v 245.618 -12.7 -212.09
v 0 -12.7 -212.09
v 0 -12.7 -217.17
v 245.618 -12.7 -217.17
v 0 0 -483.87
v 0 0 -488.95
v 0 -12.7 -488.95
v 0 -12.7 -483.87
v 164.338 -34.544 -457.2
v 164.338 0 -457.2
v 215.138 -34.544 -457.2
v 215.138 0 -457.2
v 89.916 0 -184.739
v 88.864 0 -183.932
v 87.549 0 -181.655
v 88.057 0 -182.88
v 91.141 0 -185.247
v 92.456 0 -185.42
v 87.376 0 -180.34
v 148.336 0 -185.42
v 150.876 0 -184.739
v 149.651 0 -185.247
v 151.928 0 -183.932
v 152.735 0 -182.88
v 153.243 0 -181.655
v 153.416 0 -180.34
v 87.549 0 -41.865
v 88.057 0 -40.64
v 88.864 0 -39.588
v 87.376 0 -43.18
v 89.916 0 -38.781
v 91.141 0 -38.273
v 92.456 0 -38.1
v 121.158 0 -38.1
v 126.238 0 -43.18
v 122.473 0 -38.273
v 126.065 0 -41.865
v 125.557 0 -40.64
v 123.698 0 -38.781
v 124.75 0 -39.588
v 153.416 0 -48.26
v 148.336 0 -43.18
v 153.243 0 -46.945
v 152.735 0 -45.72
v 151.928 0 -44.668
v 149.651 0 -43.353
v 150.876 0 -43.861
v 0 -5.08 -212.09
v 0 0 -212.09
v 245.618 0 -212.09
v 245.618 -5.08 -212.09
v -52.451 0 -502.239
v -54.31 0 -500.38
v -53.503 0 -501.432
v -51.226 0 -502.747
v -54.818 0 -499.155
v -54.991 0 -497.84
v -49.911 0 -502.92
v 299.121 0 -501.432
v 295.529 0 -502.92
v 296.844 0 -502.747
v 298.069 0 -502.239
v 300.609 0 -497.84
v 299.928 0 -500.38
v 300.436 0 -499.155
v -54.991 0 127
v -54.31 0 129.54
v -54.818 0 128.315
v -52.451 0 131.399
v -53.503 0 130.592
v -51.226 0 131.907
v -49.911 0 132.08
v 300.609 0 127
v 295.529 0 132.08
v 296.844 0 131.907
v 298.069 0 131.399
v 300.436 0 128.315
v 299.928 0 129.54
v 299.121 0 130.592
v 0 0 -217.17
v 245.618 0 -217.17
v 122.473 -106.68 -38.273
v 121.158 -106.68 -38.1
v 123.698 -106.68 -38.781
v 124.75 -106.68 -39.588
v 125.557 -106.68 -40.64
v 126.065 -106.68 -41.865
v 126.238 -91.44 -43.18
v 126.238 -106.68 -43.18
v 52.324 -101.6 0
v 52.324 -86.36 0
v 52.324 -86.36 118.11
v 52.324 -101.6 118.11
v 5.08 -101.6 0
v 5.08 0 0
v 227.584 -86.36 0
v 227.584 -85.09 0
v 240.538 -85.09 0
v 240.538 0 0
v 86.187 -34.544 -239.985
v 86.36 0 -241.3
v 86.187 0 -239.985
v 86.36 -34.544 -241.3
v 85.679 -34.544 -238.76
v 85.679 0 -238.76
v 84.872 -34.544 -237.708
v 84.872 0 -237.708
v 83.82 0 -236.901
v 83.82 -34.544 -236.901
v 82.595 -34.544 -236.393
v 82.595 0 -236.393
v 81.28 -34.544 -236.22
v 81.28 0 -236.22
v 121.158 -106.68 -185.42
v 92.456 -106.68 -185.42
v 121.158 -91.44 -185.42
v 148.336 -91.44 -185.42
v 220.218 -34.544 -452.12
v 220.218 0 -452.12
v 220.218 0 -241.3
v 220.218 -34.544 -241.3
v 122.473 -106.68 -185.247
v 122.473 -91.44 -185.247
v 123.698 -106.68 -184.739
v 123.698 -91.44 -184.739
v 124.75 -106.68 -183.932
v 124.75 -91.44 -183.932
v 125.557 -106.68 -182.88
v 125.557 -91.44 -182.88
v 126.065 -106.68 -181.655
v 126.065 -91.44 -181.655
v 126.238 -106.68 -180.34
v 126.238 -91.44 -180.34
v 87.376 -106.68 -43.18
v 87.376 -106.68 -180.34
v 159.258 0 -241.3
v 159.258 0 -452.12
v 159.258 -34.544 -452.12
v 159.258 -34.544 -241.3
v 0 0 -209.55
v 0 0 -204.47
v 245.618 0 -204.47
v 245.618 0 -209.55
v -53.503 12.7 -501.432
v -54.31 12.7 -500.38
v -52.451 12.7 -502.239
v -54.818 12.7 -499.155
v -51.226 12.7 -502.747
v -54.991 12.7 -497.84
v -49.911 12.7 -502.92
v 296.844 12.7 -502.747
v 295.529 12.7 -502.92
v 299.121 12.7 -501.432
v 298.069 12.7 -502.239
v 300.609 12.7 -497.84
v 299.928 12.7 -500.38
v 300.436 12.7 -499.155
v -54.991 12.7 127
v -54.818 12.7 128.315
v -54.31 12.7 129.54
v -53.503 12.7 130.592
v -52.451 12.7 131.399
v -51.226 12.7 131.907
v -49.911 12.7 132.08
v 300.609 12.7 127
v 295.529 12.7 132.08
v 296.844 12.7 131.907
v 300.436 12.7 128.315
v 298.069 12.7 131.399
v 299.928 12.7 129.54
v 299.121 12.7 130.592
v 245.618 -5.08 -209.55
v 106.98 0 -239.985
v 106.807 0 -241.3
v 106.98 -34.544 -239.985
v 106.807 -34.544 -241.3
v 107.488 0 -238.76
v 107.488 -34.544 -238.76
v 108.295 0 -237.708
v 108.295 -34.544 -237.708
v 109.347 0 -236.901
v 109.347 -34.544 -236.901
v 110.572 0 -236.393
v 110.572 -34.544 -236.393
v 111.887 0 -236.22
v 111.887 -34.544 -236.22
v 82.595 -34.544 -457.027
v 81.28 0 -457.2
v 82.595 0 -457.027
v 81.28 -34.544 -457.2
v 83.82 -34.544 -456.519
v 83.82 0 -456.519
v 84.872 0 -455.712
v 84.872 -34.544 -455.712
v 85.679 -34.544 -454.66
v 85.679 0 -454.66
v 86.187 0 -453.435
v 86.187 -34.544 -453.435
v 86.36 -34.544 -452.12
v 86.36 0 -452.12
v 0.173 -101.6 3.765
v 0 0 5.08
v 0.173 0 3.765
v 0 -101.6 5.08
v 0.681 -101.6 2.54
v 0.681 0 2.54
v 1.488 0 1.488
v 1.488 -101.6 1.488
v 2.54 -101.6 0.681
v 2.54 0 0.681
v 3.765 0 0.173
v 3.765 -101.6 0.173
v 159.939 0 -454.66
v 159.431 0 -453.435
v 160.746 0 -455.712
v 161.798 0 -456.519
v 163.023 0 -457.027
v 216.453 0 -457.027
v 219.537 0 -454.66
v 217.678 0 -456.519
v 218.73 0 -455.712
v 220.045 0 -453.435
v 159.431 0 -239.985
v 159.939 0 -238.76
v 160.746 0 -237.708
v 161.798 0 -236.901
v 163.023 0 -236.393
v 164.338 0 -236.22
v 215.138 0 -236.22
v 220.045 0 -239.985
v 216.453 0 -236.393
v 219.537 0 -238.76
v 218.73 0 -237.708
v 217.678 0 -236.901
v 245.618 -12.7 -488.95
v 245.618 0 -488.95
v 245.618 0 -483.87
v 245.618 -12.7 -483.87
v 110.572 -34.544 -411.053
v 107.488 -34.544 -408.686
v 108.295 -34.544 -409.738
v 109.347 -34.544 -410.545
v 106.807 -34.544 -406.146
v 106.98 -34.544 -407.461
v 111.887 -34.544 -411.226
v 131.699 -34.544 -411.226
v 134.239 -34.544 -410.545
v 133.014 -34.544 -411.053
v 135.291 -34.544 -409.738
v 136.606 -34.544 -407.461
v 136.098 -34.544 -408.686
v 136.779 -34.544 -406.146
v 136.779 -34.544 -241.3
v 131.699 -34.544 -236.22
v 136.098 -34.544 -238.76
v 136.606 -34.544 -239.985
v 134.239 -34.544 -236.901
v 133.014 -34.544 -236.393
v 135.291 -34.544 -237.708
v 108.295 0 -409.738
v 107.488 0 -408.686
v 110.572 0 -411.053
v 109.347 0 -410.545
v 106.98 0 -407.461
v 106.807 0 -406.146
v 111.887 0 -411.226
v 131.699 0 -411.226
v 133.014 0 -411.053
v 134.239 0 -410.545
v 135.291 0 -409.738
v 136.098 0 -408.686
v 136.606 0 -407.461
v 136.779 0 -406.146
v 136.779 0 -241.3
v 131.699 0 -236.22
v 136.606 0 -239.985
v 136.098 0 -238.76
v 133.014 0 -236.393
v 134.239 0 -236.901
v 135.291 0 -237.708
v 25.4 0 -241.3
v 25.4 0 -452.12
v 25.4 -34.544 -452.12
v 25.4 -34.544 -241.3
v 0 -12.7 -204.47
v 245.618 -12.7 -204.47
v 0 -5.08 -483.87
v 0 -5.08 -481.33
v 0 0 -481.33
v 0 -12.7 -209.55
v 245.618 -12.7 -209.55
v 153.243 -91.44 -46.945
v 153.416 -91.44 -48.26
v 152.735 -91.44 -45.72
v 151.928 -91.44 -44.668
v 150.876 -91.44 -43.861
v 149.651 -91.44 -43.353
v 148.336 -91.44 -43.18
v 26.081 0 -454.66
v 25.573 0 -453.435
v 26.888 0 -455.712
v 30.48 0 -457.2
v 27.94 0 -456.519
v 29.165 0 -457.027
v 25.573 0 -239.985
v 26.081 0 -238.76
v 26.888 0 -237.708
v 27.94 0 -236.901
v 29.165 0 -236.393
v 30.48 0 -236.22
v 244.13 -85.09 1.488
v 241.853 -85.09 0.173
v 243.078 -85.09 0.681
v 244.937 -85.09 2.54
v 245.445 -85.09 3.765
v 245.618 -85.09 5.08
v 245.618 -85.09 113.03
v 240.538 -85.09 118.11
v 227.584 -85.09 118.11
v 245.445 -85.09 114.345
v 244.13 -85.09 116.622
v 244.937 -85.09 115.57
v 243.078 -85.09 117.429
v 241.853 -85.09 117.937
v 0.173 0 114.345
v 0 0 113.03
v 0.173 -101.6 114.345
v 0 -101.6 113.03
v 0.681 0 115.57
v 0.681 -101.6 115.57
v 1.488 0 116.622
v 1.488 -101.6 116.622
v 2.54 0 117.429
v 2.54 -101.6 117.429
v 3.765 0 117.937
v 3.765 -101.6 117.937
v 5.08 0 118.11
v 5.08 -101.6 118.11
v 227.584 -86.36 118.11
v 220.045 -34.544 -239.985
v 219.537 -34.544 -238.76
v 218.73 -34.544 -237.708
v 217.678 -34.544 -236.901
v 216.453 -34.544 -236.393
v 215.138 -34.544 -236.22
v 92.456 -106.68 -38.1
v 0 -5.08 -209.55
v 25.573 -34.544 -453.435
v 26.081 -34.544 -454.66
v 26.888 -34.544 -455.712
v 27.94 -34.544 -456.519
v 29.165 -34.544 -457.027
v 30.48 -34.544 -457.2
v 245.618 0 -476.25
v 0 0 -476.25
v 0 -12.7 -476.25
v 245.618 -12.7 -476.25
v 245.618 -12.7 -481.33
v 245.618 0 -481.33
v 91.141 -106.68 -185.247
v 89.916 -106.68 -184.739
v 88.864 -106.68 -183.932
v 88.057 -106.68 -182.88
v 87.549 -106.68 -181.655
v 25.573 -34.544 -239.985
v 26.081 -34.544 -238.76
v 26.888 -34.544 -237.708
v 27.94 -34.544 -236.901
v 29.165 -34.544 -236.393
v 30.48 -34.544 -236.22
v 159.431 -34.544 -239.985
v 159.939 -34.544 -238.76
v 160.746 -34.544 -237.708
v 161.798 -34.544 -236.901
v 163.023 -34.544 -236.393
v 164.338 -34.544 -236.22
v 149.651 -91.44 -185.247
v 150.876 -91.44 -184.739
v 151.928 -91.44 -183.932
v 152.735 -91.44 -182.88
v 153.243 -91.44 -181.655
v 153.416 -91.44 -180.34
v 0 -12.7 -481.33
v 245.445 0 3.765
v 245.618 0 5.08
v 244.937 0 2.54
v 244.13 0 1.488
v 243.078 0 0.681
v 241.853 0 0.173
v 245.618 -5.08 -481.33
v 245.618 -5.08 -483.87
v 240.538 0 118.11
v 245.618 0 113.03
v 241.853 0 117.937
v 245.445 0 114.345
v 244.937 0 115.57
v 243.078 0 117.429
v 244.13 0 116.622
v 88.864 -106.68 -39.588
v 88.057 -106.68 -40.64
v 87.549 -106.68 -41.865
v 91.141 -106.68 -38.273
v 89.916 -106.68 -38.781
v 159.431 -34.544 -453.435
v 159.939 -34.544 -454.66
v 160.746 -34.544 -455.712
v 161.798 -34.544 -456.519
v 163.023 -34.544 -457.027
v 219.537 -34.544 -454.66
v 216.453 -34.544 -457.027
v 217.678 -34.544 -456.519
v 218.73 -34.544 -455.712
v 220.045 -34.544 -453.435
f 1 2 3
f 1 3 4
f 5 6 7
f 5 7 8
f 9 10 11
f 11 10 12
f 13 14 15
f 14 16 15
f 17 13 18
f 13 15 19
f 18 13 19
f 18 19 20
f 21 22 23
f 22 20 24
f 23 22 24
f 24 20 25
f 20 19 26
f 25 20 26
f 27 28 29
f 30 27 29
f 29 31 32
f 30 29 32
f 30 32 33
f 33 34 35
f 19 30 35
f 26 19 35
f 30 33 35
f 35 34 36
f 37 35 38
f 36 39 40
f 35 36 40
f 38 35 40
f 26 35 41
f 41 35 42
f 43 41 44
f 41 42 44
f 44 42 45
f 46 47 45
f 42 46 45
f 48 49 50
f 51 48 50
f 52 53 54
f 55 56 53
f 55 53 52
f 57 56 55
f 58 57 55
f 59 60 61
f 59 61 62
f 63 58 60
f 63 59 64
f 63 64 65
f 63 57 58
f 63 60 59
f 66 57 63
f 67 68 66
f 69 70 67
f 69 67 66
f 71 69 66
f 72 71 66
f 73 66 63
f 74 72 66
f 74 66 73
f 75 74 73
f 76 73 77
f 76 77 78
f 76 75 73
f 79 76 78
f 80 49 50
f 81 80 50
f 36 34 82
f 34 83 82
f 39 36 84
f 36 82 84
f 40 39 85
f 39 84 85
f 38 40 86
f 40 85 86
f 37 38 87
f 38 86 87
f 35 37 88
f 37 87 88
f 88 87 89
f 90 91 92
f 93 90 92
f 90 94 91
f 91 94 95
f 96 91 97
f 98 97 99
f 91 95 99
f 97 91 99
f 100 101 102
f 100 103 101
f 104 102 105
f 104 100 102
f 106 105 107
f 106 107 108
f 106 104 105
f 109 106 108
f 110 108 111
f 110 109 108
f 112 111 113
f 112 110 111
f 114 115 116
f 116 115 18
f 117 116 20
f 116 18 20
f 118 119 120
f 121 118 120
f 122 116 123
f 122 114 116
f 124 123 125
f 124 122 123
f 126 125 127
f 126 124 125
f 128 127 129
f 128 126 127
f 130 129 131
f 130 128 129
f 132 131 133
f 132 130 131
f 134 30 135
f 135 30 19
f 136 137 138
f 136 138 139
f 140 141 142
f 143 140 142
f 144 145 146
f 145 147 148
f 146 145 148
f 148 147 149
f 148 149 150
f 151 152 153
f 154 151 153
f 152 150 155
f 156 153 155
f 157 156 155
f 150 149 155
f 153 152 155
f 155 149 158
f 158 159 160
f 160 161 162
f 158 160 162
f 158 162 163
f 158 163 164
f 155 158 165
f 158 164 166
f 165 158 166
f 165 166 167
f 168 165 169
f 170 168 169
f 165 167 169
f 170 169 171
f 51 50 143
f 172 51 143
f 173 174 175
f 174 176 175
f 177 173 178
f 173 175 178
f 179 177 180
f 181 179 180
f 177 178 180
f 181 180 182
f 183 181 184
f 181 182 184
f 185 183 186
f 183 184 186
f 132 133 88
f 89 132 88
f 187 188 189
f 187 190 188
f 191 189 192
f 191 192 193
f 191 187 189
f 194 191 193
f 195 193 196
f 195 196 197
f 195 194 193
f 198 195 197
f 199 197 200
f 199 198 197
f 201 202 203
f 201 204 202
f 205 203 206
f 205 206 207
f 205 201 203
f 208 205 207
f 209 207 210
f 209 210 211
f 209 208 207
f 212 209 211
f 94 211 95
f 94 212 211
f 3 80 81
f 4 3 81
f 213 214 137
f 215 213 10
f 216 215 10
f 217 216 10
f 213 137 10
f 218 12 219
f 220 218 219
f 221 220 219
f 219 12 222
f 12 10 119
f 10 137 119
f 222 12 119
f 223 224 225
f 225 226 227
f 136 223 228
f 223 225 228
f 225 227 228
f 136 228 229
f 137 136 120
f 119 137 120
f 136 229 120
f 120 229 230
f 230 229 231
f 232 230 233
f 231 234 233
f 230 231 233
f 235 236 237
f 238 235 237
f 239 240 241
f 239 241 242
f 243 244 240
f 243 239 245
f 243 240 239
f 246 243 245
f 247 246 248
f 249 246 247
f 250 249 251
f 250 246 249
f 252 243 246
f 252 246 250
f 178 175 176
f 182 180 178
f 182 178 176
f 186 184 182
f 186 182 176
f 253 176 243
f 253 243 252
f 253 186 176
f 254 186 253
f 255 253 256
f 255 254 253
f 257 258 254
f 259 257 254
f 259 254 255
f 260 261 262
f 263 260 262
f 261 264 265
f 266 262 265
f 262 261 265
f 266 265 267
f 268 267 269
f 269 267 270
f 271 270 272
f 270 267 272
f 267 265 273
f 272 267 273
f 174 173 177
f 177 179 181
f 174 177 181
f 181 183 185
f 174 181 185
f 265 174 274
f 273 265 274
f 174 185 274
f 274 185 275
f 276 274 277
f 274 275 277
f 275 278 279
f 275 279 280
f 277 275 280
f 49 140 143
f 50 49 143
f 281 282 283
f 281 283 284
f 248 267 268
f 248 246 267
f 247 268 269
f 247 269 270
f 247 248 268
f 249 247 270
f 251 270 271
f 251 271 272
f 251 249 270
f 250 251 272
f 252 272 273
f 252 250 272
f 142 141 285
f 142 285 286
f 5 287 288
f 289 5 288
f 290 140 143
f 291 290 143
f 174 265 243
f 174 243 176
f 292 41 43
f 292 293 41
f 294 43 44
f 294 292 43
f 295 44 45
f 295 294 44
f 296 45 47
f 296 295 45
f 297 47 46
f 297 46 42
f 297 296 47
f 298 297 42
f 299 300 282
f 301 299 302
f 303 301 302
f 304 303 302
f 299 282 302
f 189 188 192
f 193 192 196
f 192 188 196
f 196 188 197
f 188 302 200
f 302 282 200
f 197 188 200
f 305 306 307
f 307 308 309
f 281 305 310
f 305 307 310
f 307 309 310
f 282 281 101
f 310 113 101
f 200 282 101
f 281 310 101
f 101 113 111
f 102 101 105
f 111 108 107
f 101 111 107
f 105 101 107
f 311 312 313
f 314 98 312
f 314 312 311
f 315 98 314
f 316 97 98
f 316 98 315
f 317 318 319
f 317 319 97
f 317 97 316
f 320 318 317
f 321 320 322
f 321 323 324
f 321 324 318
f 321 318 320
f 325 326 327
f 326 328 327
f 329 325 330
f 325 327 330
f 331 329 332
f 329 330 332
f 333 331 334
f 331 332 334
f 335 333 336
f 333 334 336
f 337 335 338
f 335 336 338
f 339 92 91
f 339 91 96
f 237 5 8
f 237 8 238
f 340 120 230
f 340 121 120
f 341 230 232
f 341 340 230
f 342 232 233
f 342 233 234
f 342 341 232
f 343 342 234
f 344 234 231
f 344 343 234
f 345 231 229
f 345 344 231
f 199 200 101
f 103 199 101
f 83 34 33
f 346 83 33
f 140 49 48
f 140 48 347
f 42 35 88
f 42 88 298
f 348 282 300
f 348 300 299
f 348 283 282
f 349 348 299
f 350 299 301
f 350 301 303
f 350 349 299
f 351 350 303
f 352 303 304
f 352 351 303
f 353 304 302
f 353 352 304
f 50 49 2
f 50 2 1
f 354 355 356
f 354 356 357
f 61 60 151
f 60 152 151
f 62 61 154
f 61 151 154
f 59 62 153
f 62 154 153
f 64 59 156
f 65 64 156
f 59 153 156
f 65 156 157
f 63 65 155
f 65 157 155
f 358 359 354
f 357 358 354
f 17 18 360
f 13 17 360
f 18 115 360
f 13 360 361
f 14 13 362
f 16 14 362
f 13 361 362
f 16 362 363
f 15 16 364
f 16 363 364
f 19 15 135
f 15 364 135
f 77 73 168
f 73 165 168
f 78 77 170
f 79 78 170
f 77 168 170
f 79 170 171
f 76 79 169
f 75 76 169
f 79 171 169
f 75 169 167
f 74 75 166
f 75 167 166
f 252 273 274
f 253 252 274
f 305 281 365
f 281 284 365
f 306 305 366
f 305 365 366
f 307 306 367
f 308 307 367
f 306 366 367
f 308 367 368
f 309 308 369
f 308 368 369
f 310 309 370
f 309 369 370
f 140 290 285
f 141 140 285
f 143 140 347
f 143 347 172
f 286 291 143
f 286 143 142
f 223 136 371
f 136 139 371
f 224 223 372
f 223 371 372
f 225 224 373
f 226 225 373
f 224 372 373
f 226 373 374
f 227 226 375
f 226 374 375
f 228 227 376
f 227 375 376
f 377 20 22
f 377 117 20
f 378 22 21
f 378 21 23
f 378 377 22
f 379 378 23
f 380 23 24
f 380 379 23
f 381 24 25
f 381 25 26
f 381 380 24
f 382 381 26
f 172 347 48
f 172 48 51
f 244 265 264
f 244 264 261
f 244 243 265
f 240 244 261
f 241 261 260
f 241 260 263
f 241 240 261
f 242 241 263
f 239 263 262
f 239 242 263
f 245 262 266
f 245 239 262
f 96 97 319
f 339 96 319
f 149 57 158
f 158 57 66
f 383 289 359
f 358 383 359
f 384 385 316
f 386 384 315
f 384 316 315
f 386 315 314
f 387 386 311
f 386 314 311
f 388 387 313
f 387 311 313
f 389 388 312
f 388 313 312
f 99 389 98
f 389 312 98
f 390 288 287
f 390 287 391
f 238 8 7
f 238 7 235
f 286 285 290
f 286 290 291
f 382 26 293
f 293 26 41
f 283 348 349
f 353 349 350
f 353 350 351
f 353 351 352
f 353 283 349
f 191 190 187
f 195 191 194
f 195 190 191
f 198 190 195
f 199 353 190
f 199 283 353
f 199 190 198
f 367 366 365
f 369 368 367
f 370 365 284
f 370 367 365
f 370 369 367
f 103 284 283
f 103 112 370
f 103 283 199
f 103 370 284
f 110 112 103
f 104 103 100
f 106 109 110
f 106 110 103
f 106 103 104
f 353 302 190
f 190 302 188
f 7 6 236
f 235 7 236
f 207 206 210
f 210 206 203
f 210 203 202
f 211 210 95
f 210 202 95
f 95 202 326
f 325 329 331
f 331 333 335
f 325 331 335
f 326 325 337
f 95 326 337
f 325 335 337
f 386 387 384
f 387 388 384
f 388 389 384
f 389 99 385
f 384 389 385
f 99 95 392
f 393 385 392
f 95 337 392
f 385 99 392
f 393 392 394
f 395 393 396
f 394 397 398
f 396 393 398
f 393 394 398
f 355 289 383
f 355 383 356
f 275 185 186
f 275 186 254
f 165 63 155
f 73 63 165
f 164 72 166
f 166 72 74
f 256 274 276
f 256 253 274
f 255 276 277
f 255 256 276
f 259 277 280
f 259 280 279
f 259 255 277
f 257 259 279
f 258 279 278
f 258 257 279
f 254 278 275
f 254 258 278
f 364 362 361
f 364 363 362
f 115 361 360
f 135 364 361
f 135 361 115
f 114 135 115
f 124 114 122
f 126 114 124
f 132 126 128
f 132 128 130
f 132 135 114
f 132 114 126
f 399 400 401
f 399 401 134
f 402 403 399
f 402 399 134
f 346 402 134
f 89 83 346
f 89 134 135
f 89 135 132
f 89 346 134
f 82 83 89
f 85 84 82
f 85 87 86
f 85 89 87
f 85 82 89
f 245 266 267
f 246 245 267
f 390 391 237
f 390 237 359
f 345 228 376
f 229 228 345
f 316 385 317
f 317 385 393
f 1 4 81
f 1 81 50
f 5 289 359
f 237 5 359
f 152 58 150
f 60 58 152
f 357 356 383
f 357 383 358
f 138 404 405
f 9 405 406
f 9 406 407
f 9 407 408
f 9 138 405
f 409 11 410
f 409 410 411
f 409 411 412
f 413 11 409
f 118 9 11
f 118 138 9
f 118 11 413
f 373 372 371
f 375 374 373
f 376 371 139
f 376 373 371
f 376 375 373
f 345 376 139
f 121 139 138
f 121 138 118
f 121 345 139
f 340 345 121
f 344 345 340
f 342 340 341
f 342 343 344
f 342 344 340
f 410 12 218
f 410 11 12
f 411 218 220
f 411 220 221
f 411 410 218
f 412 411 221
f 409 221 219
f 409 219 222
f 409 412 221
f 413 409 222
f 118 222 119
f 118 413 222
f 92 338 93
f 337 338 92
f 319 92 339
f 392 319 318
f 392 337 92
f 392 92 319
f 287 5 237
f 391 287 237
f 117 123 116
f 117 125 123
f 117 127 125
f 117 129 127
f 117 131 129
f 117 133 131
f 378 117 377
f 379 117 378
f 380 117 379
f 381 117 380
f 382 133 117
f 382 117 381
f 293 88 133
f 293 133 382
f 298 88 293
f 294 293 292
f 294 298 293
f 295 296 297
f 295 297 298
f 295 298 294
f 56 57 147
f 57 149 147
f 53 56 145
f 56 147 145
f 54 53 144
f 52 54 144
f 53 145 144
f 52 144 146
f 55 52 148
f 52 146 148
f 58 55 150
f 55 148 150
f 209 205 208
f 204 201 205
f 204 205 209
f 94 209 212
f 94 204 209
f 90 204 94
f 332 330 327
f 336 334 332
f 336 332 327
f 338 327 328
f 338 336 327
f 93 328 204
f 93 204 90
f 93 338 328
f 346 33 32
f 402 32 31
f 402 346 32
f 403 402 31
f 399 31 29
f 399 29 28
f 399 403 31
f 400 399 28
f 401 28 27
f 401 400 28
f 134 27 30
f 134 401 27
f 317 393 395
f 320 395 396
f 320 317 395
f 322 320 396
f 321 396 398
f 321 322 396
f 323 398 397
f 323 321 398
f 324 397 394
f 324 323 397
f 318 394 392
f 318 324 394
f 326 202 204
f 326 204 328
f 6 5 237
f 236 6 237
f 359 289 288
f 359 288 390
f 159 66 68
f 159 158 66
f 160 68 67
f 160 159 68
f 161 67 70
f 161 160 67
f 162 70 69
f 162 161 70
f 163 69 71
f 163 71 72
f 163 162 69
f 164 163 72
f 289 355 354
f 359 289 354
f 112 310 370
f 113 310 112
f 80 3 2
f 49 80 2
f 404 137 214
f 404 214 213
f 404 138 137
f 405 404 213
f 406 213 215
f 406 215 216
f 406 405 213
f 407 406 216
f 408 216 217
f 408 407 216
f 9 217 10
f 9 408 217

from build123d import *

# Parameters (mm, degrees)
F0_W      = 18.034
F0_H      = 118.11
F1_DEPTH  = 85.09
F0_W_2    = 35.052
F0_W_3    = 70.104
F2_DEPTH  = 86.36
F0_W_4    = 52.324
F3_DEPTH  = 101.6
F0_W_5    = 27.178
F0_H_2    = 142.24
F4_DEPTH  = 91.44
F5_DEPTH  = 106.68
F0_W_6    = 60.96
F0_H_3    = 220.98
F0_W_7    = 29.972
F0_H_4    = 175.006
F6_DEPTH  = 34.544
F7_W      = 245.618
F7_H      = 5.08
F8_DEPTH  = 12.7
F7_H_2    = 2.54
F9_DEPTH  = 5.08
F10_W     = 355.6
F10_H     = 635
F11_DEPTH = 12.7
F12_R     = 5.08
F13_R     = 5.08
F13_2_R   = 5.08
F14_R     = 5.08
F15_R     = 5.08


with BuildPart() as f1:
    # F0 (on Front) → F1 (new body)
    with BuildSketch(Plane.XZ):
        with Locations((236.601, 59.055)):
            Rectangle(F0_W, F0_H)
    extrude(amount=F1_DEPTH)

    # F0 (on Front) → F2 (join)
    with BuildSketch(Plane.XZ):
        with Locations((210.058, 59.055)):
            Rectangle(F0_W_2, F0_H)
        with Locations((175.006, 59.055)):
            Rectangle(F0_W_2, F0_H)
        with Locations((122.428, 59.055)):
            Rectangle(F0_W_3, F0_H)
        with Locations((69.85, 59.055)):
            Rectangle(F0_W_2, F0_H)
    extrude(amount=F2_DEPTH)

    # F0 (on Front) → F3 (join)
    with BuildSketch(Plane.XZ):
        with Locations((26.162, 59.055)):
            Rectangle(F0_W_4, F0_H)
    extrude(amount=F3_DEPTH)

    # F14
    f14_edges = [f1.edges().sort_by_distance(p)[0] for p in [
        (0, -50.8, 118.11),
        (0, -50.8, 0),
        (245.618, -42.545, 118.11),
        (245.618, -42.545, 0),
    ]]
    fillet(f14_edges, radius=F14_R)


with BuildPart() as f4:
    # F0 (on Front) → F4 (new body)
    with BuildSketch(Plane.XZ):
        with Locations((139.827, -114.3)):
            Rectangle(F0_W_5, F0_H_2)
    extrude(amount=F4_DEPTH)

    # F0 (on Front) → F5 (join)
    with BuildSketch(Plane.XZ):
        Polygon((126.238, -38.1), (87.376, -38.1), (87.376, -185.42), (126.238, -185.42), (126.238, -43.18), align=None)
    extrude(amount=F5_DEPTH)

    # F13#2
    f13_2_edges = [f4.edges().sort_by_distance(p)[0] for p in [
        (87.376, -53.34, -185.42),
        (87.376, -53.34, -38.1),
        (153.416, -45.72, -43.18),
        (126.238, -53.34, -38.1),
        (153.416, -45.72, -185.42),
        (126.238, -99.06, -185.42),
    ]]
    fillet(f13_2_edges, radius=F13_2_R)


with BuildPart() as f6:
    # F0 (on Front) → F6 (new body)
    with BuildSketch(Plane.XZ):
        with Locations((55.88, -346.71)):
            Rectangle(F0_W_6, F0_H_3)
        with Locations((189.738, -346.71)):
            Rectangle(F0_W_6, F0_H_3)
        with Locations((121.793, -323.723)):
            Rectangle(F0_W_7, F0_H_4)
    extrude(amount=F6_DEPTH)

    # F12
    f12_edges = [f6.edges().sort_by_distance(p)[0] for p in [
        (86.36, -17.272, -236.22),
        (136.779, -17.272, -236.22),
        (220.218, -17.272, -236.22),
        (159.258, -17.272, -236.22),
        (25.4, -17.272, -236.22),
        (25.4, -17.272, -457.2),
        (106.807, -17.272, -411.226),
        (159.258, -17.272, -457.2),
        (86.36, -17.272, -457.2),
        (136.779, -17.272, -411.226),
        (220.218, -17.272, -457.2),
    ]]
    fillet(f12_edges, radius=F12_R)

    # F13
    f13_edges = [f6.edges().sort_by_distance(p)[0] for p in [
        (106.807, -17.272, -236.22),
    ]]
    fillet(f13_edges, radius=F13_R)


with BuildPart() as f8:
    # F7 (on Front) → F8 (new body)
    with BuildSketch(Plane.XZ):
        with Locations((122.809, -207.01)):
            Rectangle(F7_W, F7_H)
        with Locations((122.809, -214.63)):
            Rectangle(F7_W, F7_H)
        with Locations((122.809, -486.41)):
            Rectangle(F7_W, F7_H)
        with Locations((122.809, -478.79)):
            Rectangle(F7_W, F7_H)
    extrude(amount=F8_DEPTH)


with BuildPart() as f9:
    # F7 (on Front) → F9 (new body)
    with BuildSketch(Plane.XZ):
        with Locations((122.809, -210.82)):
            Rectangle(F7_W, F7_H_2)
        with Locations((122.809, -482.6)):
            Rectangle(F7_W, F7_H_2)
    extrude(amount=F9_DEPTH)


with BuildPart() as f11:
    # F10 (on Front) → F11 (new body)
    with BuildSketch(Plane.XZ):
        with Locations((122.809, -185.42)):
            Rectangle(F10_W, F10_H)
    extrude(amount=-F11_DEPTH)

    # F15
    f15_edges = [f11.edges().sort_by_distance(p)[0] for p in [
        (-54.991, 6.35, 132.08),
        (300.609, 6.35, 132.08),
        (300.609, 6.35, -502.92),
        (-54.991, 6.35, -502.92),
    ]]
    fillet(f15_edges, radius=F15_R)


solid = Compound([f1.part, f4.part, f6.part, f8.part, f9.part, f11.part])
